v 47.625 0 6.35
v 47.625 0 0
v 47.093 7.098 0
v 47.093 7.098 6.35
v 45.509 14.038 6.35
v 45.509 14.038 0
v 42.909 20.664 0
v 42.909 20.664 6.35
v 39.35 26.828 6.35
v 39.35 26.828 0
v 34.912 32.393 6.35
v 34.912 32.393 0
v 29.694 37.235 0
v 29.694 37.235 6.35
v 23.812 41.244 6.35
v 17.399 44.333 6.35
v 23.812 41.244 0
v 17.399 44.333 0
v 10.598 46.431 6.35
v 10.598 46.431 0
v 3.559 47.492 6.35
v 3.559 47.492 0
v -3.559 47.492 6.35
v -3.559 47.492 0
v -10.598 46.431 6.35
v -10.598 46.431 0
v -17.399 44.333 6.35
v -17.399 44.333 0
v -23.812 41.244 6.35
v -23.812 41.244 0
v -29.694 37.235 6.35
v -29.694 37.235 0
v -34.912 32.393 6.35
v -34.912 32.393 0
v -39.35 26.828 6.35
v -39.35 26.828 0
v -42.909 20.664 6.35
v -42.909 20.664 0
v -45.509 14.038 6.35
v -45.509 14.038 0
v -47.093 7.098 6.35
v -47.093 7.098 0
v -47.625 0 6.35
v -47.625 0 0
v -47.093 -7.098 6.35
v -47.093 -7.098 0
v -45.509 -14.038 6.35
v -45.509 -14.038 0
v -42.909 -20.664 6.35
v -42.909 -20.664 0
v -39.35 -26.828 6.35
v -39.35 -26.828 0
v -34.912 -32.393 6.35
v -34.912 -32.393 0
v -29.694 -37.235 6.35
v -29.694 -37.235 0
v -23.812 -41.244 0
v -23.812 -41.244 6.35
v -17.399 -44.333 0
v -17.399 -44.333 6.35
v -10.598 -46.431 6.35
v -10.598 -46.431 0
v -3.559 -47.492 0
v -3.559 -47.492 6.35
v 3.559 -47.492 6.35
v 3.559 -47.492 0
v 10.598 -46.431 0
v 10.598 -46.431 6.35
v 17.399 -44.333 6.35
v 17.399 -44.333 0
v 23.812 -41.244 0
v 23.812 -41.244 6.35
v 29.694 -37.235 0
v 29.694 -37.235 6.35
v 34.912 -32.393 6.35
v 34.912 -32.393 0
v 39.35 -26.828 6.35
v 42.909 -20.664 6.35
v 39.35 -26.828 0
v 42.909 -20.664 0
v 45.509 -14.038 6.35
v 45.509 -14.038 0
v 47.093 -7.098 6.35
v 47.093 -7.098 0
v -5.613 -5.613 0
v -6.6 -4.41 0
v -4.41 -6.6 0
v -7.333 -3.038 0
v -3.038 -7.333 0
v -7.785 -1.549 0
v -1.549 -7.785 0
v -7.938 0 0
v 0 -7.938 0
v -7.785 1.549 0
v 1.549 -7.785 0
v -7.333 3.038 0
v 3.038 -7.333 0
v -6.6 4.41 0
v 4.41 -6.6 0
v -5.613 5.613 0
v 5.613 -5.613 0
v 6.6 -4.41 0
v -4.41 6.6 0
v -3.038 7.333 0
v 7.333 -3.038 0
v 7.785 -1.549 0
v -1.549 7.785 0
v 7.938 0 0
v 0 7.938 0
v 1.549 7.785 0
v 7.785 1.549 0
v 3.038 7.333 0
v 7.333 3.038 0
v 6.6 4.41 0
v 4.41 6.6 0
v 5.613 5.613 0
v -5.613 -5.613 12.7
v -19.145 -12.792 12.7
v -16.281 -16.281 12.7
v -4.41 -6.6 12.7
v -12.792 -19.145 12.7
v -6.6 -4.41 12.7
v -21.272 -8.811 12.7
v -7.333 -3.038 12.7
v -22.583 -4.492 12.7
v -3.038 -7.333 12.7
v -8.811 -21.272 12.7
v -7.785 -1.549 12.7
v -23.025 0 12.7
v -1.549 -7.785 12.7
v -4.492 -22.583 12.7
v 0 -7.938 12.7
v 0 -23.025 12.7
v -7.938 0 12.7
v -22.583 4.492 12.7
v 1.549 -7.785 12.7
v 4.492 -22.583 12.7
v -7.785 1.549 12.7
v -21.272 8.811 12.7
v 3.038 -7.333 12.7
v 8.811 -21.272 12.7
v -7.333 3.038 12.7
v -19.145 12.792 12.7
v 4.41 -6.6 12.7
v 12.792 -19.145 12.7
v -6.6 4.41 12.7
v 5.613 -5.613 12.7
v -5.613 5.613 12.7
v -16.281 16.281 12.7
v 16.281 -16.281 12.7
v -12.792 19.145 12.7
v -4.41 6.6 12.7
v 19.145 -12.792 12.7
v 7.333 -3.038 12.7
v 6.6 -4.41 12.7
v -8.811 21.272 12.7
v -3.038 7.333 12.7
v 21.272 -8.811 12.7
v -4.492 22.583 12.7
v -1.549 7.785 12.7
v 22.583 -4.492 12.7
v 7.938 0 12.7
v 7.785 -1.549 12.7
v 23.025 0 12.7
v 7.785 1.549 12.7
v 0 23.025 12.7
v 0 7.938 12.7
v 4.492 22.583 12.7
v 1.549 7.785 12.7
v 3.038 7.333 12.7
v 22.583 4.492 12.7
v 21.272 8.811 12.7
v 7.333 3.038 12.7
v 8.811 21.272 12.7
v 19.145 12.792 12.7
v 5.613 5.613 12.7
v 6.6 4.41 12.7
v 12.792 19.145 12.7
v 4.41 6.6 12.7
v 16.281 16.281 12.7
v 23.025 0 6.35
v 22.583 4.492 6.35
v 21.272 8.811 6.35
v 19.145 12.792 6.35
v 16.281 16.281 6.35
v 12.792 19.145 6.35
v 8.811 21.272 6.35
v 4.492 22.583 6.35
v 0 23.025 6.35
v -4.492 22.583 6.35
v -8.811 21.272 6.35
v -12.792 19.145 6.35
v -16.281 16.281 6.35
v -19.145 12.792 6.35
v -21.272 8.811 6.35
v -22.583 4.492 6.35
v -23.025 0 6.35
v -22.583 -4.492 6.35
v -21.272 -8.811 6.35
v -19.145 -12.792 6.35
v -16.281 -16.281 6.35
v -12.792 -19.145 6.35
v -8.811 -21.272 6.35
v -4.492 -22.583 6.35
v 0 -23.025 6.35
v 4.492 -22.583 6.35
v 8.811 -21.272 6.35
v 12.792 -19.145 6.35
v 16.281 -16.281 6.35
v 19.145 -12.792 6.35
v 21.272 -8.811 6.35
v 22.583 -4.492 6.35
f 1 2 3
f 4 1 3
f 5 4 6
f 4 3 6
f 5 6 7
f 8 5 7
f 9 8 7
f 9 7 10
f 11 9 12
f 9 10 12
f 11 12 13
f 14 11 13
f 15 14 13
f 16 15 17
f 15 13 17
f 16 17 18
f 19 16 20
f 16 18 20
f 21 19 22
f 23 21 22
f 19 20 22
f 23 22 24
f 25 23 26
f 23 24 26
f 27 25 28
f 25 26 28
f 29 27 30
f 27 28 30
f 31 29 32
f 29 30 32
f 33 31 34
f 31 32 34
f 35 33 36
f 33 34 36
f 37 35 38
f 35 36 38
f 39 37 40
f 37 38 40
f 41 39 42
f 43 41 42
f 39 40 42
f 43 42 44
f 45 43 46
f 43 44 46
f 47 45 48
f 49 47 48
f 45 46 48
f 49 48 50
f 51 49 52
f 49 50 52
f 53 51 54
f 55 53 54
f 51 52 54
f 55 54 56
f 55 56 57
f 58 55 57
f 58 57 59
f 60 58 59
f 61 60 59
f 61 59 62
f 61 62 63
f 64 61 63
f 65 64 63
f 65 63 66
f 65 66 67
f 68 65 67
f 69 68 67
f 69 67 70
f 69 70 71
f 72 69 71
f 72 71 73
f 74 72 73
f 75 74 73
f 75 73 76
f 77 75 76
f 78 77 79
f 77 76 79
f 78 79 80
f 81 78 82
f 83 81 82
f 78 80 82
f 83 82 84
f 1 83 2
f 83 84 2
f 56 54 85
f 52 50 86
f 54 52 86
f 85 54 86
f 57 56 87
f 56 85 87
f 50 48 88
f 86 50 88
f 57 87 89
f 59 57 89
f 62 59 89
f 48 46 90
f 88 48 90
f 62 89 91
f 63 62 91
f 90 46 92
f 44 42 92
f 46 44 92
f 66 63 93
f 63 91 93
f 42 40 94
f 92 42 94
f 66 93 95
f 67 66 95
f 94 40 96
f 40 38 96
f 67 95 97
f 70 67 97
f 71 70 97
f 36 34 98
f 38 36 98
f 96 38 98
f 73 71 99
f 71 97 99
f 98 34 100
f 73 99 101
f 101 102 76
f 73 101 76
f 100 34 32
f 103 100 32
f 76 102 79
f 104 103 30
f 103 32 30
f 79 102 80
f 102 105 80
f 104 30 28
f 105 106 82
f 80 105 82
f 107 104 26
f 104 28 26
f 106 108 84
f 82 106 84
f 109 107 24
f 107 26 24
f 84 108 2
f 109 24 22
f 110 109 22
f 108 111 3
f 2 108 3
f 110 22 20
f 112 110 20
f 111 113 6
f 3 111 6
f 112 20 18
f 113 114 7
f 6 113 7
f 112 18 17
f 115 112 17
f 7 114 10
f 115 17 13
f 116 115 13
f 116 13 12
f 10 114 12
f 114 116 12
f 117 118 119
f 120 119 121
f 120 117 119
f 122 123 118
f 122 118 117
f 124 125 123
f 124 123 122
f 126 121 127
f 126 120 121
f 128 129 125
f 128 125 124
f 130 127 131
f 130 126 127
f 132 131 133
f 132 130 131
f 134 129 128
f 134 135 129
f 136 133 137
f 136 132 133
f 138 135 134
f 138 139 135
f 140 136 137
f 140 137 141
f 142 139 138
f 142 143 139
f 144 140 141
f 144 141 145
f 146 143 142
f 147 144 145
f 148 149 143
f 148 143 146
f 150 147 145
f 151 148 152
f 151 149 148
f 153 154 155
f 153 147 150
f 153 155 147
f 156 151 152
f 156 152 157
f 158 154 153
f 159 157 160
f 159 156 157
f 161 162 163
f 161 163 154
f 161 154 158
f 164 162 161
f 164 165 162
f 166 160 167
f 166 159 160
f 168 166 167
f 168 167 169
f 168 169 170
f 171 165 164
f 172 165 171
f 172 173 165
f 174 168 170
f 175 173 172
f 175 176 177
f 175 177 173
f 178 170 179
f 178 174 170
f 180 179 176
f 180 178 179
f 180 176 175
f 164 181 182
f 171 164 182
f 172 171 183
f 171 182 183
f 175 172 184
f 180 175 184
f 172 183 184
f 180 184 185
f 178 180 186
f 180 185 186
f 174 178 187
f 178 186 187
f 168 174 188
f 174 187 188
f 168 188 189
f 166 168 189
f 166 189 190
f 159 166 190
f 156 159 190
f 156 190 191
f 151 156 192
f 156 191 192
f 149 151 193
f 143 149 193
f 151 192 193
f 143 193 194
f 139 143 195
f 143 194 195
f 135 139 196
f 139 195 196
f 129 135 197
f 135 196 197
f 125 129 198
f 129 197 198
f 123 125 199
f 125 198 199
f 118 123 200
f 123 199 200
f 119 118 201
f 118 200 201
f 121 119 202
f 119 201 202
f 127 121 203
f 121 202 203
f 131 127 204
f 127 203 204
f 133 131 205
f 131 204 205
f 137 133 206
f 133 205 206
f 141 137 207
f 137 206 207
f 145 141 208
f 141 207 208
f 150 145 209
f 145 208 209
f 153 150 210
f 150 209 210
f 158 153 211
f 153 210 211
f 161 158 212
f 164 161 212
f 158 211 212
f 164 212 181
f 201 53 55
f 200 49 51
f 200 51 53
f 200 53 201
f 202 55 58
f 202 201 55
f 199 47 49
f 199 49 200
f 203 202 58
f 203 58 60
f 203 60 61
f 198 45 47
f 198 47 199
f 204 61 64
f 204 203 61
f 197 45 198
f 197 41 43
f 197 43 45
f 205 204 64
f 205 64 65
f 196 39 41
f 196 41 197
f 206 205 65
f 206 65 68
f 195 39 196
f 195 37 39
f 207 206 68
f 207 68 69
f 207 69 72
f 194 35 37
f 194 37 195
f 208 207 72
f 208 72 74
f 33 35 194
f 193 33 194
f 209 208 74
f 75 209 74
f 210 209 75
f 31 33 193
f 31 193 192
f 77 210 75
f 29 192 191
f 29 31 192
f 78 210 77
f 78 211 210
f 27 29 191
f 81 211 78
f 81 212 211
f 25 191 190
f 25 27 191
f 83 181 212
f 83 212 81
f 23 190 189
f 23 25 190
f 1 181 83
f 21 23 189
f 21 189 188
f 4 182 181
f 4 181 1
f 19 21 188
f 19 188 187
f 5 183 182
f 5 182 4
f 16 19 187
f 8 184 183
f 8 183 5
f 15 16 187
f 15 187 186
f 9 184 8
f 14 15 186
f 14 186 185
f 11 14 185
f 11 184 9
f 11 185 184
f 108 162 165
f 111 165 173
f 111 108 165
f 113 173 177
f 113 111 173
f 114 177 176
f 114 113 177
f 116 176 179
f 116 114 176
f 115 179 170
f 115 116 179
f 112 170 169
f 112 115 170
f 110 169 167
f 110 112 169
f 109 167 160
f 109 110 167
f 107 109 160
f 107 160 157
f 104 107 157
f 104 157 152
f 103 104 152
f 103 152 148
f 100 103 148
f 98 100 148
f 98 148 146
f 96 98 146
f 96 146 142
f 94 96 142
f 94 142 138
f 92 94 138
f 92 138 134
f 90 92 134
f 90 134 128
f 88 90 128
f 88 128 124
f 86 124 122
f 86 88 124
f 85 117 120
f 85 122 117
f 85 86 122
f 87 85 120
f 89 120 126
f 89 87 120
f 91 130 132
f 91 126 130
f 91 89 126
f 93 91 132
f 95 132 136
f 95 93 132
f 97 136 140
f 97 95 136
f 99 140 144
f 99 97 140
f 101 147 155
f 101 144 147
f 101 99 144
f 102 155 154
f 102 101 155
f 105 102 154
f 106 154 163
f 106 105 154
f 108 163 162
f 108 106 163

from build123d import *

# Parameters (mm, degrees)
SKETCH1_R           = 47.625
BOSS_EXTRUDE1_DEPTH = 6.35
SKETCH2_R           = 23.0251
BOSS_EXTRUDE2_DEPTH = 6.35
SKETCH4_R           = 7.9375
CUT_EXTRUDE2_DEPTH  = 69.538830235


with BuildPart() as part:
    # Sketch1 → Boss-Extrude1 (new body)
    with BuildSketch(Plane.XY):
        Circle(SKETCH1_R)
    extrude(amount=BOSS_EXTRUDE1_DEPTH)

    # Sketch2 → Boss-Extrude2 (add)
    with BuildSketch(Plane.XY.offset(6.35)):
        Circle(SKETCH2_R)
    extrude(amount=BOSS_EXTRUDE2_DEPTH)

    # Sketch4 → Cut-Extrude2 (cut, through all)
    with BuildSketch(Plane.XY):
        Circle(SKETCH4_R)
    extrude(amount=CUT_EXTRUDE2_DEPTH, mode=Mode.SUBTRACT)


solid = part.part
